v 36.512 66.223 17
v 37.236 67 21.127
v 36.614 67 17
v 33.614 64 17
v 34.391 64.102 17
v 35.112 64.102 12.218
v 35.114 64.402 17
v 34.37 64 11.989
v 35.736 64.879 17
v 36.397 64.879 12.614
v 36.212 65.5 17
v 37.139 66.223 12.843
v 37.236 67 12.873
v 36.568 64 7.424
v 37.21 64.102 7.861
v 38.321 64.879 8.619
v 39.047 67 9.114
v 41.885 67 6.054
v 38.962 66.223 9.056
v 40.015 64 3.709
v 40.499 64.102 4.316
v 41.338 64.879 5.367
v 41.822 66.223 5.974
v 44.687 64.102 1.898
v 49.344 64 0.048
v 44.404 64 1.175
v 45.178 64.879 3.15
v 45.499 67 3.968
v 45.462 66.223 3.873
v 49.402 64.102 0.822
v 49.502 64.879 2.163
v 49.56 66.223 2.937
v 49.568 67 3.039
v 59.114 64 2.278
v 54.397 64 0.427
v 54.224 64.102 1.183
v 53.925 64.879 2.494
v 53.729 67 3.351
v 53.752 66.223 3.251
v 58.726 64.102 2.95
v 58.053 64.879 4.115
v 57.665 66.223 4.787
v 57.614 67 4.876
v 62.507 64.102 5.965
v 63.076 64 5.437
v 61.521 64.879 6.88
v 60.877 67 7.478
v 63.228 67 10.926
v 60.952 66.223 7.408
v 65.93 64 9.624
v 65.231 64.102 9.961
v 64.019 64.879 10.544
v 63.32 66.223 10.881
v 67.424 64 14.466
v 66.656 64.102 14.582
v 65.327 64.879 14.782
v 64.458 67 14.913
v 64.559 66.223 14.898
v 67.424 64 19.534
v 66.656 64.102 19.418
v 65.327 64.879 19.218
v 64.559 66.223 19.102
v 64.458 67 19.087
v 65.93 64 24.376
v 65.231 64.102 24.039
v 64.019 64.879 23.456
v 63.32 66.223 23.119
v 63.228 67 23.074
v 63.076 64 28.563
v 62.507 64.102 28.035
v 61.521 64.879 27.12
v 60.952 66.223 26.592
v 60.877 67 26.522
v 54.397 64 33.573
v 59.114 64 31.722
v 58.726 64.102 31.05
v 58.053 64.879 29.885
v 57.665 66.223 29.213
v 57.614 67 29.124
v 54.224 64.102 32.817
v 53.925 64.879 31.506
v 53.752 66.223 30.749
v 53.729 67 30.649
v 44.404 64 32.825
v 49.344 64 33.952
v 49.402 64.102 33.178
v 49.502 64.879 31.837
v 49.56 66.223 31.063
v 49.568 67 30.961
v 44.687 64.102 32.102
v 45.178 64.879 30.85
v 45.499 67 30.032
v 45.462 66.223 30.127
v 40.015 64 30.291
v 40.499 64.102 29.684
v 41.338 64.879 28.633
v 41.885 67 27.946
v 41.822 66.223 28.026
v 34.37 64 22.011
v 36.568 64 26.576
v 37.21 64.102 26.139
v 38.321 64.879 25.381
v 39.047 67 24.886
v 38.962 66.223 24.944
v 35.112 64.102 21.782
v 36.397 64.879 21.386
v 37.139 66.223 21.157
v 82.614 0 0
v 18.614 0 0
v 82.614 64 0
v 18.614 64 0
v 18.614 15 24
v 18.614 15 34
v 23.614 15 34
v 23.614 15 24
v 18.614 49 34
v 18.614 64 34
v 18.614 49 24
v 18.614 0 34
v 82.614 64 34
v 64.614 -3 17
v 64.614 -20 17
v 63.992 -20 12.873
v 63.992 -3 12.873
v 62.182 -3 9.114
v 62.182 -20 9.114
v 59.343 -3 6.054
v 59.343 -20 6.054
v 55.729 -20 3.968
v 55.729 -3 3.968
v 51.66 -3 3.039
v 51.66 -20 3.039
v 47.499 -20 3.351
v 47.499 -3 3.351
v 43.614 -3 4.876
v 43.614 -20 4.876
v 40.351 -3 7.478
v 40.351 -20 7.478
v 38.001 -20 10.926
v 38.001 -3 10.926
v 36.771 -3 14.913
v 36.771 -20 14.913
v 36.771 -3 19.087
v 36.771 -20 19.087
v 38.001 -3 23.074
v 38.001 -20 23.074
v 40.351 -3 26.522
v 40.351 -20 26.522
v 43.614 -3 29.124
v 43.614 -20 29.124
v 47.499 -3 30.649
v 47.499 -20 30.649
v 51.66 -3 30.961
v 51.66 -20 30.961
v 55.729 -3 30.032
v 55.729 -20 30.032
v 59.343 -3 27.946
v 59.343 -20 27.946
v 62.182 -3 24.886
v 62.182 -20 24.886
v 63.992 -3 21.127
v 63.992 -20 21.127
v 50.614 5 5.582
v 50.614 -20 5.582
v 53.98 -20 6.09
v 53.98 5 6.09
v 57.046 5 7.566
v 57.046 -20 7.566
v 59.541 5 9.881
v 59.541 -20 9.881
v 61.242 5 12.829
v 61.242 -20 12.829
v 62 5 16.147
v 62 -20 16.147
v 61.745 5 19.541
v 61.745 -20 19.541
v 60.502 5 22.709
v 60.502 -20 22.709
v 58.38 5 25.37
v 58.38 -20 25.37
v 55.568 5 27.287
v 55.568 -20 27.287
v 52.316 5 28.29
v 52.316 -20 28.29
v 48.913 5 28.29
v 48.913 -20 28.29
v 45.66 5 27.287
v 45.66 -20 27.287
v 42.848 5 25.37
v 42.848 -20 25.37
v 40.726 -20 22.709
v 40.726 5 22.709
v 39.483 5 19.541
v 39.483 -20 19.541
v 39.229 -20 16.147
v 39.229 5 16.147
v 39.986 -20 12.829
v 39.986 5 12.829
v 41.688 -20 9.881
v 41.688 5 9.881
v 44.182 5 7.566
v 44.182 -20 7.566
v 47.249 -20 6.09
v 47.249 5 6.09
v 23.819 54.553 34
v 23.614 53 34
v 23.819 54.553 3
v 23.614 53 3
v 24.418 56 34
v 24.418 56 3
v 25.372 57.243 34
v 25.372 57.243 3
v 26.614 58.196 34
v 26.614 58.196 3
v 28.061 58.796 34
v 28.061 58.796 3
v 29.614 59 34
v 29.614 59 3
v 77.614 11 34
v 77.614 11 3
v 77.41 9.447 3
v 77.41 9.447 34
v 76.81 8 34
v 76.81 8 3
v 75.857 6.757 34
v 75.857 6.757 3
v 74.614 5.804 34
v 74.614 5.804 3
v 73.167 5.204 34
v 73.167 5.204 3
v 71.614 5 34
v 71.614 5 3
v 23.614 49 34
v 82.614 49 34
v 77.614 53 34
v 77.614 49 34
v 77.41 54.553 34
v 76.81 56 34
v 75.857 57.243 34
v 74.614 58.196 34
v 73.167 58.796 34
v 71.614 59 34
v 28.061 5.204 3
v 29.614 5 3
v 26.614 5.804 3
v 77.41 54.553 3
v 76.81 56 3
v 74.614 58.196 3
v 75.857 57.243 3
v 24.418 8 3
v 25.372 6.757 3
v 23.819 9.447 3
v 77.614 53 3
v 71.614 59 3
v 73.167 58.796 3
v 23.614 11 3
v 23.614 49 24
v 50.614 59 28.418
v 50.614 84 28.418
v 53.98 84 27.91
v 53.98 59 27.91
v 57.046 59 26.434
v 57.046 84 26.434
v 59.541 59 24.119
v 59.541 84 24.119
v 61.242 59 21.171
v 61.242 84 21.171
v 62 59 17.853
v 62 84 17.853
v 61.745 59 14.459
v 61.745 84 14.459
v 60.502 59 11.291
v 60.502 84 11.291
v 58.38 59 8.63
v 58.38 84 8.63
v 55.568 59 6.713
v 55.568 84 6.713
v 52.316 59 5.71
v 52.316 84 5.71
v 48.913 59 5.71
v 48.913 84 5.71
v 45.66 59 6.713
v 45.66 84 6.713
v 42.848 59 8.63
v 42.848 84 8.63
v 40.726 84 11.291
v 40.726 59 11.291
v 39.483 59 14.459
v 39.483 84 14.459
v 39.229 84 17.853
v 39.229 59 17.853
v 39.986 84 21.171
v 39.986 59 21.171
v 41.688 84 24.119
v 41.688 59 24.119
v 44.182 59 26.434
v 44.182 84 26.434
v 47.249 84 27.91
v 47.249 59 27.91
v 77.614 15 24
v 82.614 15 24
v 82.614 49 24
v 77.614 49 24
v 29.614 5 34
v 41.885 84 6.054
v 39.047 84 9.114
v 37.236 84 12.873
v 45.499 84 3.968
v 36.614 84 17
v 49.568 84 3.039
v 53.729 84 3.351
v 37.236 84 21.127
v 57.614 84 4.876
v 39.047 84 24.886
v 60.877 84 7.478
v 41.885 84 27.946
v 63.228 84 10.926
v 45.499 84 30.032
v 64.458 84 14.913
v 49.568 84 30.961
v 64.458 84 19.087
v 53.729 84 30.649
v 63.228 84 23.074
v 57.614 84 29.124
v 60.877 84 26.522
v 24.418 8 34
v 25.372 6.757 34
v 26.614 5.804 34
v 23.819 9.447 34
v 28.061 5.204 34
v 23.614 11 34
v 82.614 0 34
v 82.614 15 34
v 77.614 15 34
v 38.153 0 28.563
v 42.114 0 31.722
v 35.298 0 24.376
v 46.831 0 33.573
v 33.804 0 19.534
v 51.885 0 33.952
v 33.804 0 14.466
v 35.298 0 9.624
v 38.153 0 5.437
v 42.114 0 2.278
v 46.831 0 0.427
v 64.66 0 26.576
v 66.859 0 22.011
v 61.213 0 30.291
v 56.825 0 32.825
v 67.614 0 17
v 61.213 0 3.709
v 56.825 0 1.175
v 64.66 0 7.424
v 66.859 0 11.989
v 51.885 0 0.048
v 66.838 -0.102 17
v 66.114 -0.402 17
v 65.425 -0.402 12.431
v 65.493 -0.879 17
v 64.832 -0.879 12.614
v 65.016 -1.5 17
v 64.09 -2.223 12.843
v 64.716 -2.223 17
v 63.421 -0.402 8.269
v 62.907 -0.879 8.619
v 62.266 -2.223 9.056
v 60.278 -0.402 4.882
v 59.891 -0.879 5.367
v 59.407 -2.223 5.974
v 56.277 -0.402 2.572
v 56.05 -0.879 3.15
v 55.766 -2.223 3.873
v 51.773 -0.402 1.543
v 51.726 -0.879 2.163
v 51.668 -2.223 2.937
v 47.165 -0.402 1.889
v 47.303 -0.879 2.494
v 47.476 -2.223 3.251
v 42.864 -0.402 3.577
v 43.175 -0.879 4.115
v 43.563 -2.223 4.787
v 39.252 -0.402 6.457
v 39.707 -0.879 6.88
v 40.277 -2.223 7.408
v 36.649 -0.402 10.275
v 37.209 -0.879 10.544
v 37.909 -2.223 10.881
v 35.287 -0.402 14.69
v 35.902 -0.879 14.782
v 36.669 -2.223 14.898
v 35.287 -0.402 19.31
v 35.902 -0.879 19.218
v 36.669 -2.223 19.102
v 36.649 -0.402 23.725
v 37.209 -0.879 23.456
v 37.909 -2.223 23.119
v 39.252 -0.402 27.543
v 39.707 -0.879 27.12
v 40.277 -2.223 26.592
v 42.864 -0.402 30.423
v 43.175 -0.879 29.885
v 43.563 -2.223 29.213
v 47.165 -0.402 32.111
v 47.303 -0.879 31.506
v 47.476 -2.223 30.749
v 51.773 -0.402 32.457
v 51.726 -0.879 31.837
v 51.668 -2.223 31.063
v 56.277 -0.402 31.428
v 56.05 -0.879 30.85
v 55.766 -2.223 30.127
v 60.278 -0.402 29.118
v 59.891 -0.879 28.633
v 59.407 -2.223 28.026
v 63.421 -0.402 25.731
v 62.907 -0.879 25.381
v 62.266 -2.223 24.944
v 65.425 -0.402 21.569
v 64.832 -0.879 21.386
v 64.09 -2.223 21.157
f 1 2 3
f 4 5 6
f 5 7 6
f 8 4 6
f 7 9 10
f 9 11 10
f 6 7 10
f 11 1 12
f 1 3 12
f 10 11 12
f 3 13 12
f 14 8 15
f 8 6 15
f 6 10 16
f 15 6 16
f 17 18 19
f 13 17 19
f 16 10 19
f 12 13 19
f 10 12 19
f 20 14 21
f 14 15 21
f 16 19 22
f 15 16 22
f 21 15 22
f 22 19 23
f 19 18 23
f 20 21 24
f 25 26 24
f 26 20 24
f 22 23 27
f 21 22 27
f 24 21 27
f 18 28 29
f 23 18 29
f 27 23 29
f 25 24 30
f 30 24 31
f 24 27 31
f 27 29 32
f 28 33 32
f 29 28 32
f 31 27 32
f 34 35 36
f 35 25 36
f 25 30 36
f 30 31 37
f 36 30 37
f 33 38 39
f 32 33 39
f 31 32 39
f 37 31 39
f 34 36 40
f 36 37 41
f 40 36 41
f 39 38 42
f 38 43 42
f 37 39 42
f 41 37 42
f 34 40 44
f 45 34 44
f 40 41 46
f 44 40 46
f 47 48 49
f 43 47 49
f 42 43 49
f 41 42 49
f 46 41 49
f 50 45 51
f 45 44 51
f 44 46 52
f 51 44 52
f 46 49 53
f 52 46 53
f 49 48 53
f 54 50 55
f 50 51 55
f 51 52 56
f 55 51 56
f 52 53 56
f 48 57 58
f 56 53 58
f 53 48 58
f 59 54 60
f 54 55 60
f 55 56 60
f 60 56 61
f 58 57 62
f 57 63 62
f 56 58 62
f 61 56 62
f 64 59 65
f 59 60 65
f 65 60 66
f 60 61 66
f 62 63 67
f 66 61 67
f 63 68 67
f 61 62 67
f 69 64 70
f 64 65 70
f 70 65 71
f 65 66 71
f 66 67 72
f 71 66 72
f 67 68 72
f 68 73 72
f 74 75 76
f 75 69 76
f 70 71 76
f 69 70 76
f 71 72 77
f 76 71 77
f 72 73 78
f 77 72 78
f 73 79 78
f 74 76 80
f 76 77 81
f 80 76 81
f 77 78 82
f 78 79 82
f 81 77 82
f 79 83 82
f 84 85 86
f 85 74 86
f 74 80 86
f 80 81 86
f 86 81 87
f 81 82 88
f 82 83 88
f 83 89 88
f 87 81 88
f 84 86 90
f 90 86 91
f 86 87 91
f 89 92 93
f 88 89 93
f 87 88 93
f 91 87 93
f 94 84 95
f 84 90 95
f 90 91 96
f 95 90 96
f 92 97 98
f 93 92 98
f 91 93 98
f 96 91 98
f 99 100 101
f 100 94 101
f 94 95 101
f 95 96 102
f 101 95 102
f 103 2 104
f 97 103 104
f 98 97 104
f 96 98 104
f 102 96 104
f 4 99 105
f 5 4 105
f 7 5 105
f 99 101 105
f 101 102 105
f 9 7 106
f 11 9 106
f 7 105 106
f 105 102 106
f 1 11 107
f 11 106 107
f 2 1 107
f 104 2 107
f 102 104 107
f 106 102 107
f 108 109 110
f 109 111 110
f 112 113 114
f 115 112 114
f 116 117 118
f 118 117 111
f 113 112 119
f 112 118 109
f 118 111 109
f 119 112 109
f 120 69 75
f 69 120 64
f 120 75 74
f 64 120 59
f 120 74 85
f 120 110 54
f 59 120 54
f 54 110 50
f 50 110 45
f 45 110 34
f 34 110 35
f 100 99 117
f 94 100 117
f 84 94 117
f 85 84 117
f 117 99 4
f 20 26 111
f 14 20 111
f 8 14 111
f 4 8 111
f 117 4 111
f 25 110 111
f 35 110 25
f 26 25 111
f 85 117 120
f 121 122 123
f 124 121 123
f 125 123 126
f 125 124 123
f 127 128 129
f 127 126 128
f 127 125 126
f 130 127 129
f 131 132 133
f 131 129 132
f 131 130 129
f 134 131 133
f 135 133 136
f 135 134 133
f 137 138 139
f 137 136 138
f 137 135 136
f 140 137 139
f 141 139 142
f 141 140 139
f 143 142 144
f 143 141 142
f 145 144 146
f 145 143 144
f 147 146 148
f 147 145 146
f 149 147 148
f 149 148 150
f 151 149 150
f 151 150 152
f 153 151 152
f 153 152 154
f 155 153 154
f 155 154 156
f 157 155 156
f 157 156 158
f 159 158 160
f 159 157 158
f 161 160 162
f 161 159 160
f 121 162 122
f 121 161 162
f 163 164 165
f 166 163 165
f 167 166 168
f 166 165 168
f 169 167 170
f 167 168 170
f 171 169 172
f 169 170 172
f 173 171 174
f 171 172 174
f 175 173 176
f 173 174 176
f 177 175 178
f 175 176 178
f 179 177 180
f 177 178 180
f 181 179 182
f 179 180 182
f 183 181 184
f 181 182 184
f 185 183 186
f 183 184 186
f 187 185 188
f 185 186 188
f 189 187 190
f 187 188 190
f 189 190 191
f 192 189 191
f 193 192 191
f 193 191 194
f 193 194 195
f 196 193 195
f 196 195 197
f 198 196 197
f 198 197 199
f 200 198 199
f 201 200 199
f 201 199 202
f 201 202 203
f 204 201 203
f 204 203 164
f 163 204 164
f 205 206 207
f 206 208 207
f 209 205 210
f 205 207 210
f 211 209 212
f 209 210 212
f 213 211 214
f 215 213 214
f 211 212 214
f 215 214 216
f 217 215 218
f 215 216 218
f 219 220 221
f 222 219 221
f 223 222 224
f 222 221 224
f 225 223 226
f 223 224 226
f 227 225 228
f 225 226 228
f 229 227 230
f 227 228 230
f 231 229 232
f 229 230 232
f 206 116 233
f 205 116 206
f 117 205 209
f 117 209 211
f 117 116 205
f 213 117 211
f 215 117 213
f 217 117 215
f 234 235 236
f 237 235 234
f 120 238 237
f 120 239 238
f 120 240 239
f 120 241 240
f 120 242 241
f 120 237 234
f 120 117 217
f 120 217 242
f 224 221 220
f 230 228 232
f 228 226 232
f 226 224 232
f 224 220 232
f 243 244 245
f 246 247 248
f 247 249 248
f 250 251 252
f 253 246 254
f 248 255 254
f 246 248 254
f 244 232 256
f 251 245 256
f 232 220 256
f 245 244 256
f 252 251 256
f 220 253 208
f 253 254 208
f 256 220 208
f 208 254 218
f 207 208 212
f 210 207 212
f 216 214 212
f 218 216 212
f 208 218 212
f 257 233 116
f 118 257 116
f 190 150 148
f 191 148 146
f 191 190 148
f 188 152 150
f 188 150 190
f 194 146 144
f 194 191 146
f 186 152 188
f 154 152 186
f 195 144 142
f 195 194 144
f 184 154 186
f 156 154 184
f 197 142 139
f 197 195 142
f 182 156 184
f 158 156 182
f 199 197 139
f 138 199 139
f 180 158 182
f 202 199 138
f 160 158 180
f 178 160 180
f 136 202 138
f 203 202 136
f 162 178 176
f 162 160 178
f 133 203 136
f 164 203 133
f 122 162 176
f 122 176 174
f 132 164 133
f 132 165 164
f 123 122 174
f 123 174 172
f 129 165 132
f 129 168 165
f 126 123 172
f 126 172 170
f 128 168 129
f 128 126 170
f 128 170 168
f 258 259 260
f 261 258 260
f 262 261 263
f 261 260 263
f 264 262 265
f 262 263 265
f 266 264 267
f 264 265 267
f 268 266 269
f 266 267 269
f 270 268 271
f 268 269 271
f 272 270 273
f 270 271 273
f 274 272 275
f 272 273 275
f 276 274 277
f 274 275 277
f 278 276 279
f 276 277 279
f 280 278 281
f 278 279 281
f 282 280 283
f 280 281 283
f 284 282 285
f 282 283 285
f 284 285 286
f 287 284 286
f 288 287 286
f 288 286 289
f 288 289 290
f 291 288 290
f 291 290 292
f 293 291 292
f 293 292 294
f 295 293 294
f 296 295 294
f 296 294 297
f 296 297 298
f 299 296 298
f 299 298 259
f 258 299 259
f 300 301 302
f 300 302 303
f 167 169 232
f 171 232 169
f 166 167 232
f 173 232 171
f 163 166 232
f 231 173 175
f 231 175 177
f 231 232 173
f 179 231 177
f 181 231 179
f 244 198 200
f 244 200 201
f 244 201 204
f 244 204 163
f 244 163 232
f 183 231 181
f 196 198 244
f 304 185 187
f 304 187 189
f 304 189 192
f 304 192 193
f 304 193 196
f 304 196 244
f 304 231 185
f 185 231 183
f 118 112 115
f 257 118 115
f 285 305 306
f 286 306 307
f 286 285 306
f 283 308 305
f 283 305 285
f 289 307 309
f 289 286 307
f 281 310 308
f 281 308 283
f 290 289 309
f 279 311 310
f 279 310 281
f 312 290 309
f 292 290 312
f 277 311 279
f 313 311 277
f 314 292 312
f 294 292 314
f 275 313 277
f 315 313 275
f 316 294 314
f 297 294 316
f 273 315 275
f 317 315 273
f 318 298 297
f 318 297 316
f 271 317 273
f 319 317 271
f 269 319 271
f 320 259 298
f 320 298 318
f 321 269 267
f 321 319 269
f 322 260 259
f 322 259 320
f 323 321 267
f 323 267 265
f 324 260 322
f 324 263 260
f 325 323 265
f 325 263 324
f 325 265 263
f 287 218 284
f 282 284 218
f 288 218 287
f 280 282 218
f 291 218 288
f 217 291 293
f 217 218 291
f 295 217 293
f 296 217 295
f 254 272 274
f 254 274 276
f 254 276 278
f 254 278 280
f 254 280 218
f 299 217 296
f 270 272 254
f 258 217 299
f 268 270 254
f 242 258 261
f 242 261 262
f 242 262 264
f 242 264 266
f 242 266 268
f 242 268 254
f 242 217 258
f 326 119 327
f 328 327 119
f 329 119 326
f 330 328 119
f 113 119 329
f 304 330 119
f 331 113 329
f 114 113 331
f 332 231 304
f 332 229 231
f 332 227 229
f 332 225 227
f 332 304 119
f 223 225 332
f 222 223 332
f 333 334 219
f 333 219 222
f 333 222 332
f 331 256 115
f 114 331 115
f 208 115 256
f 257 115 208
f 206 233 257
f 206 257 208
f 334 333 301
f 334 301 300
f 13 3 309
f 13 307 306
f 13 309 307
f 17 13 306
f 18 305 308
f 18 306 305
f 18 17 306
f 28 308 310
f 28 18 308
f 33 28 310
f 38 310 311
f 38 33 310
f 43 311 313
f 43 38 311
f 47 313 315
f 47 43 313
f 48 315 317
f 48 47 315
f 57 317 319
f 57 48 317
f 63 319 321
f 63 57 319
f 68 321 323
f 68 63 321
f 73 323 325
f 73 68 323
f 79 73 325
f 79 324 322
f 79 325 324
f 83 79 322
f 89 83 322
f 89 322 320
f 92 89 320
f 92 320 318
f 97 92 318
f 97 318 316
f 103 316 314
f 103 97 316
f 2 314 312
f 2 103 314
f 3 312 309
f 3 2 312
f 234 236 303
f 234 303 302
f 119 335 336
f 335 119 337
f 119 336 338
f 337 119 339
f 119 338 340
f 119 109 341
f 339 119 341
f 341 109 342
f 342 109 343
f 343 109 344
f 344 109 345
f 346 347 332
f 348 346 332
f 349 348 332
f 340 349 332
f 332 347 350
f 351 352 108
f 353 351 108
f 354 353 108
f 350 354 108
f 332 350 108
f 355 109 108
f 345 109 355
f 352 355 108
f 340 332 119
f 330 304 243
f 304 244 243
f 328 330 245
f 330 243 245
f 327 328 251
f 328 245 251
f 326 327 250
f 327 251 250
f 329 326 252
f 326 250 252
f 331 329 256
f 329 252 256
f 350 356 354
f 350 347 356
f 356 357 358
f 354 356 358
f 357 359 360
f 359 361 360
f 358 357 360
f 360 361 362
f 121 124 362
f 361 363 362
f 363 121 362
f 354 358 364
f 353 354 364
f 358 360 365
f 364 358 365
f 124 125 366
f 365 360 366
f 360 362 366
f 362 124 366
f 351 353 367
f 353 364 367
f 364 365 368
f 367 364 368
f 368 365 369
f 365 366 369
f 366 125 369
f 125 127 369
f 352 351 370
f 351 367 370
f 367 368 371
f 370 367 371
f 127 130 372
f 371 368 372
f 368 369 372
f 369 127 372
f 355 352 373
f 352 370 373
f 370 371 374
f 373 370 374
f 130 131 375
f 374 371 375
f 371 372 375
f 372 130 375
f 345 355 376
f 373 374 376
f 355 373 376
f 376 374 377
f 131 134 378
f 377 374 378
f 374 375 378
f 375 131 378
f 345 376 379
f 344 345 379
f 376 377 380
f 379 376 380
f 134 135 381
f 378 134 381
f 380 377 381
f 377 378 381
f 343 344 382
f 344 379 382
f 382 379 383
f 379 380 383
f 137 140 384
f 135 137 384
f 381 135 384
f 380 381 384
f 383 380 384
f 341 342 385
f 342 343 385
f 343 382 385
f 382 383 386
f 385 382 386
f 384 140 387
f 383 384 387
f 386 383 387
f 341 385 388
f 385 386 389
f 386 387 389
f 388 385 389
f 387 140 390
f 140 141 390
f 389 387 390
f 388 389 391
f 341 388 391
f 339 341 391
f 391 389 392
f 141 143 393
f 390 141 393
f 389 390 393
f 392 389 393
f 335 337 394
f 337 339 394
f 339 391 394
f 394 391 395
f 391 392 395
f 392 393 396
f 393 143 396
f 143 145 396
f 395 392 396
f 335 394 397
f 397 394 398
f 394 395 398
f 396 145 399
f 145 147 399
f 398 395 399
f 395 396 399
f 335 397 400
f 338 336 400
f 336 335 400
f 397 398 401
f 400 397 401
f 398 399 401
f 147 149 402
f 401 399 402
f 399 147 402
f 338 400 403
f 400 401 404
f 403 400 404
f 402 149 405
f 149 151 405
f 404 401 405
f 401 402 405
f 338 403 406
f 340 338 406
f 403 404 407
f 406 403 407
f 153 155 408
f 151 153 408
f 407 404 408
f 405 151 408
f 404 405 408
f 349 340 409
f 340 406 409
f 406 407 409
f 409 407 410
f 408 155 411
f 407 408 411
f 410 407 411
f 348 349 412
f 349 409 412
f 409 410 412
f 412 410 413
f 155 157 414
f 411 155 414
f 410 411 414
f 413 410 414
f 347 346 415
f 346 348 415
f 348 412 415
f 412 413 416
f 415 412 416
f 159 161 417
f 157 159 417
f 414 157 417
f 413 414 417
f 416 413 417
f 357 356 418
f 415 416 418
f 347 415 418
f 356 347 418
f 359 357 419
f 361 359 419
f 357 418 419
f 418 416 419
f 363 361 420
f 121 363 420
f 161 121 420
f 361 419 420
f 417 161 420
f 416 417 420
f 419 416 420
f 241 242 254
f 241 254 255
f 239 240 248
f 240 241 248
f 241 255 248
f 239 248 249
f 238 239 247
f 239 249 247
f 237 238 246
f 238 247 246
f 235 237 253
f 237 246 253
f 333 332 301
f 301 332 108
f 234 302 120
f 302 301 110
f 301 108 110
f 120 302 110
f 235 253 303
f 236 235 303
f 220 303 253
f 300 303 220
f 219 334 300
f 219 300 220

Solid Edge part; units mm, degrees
sketch "Sketch1" plane through (0, 0, 0) normal (0, 0, 1) x (1, 0, 0)
  line L0 (18.6142, 0) -> (82.6142, 0)
  line L1 (82.6142, 0) -> (82.6142, 64)
  line L2 (82.6142, 64) -> (18.6142, 64)
  line L3 (18.6142, 64) -> (18.6142, 0)
extrude "Protrusion1" add sketch "Sketch1" along normal blind 34
sketch "Sketch2" plane through (50.6142, 32, 34) normal (0, 0, 1) x (1, 0, 0)
  line L0 (-27, 27) -> (27, 27)
  line L1 (27, 27) -> (27, -27)
  line L2 (27, -27) -> (-27, -27)
  line L3 (-27, -27) -> (-27, 27)
  dimension "D1" = 5
  dimension "D2" = 5
  dimension "D3" = 54
  dimension "D4" = 5
  dimension "D5" = 5
extrude "ExtrudedCutout_1" cut sketch "Sketch2" against normal blind 31
sketch "Sketch3" plane through (50.6142, 32, 34) normal (0, 0, 1) x (0, 1, 0)
  line L0 (-17, 32) -> (-17, 27)
  line L1 (-17, 27) -> (17, 27)
  line L2 (17, 27) -> (17, 32)
  line L3 (17, 32) -> (-17, 32)
  line L4 (-17, -27) -> (17, -27)
  line L5 (17, -27) -> (17, -32)
  line L6 (17, -32) -> (-17, -32)
  line L7 (-17, -32) -> (-17, -27)
  dimension "D1" = 15
  dimension "D2" = 15
  dimension "D3" = 15
  dimension "D4" = 15
extrude "ExtrudedCutout_3" cut sketch "Sketch3" against normal blind 10
sketch "Sketch4" plane through (50.6142, 0, 17) normal (0, -1, 0) x (1, 0, 0)
  circle A0 centre (0, 0) radius 14
extrude "Protrusion2" add sketch "Sketch4" along normal blind 20
sketch "Sketch5" plane through (50.6142, 64, 17) normal (0, 1, 0) x (-1, 0, 0)
  circle A0 centre (0, 0) radius 14
extrude "ExtrudedProtrusion_3" add sketch "Sketch5" along normal blind 20
fillet "Round_1" radius 6 4 edges at (23.6142, 5, 18.5) (23.6142, 59, 18.5) (77.6142, 59, 18.5) (77.6142, 5, 18.5)
hole "Hole_4" at (50.6142, 84, 17) direction (0, -1, 0) diameter 22.835 end up to next thread major 25 thread length 6
hole "Hole_5" at (50.6142, -20, 17) direction (0, 1, 0) diameter 22.835 end up to next thread major 25 thread length 6
fillet "Round_2" radius 3 2 edges at (64.6142, 64, 17) (36.6142, 0, 17)
